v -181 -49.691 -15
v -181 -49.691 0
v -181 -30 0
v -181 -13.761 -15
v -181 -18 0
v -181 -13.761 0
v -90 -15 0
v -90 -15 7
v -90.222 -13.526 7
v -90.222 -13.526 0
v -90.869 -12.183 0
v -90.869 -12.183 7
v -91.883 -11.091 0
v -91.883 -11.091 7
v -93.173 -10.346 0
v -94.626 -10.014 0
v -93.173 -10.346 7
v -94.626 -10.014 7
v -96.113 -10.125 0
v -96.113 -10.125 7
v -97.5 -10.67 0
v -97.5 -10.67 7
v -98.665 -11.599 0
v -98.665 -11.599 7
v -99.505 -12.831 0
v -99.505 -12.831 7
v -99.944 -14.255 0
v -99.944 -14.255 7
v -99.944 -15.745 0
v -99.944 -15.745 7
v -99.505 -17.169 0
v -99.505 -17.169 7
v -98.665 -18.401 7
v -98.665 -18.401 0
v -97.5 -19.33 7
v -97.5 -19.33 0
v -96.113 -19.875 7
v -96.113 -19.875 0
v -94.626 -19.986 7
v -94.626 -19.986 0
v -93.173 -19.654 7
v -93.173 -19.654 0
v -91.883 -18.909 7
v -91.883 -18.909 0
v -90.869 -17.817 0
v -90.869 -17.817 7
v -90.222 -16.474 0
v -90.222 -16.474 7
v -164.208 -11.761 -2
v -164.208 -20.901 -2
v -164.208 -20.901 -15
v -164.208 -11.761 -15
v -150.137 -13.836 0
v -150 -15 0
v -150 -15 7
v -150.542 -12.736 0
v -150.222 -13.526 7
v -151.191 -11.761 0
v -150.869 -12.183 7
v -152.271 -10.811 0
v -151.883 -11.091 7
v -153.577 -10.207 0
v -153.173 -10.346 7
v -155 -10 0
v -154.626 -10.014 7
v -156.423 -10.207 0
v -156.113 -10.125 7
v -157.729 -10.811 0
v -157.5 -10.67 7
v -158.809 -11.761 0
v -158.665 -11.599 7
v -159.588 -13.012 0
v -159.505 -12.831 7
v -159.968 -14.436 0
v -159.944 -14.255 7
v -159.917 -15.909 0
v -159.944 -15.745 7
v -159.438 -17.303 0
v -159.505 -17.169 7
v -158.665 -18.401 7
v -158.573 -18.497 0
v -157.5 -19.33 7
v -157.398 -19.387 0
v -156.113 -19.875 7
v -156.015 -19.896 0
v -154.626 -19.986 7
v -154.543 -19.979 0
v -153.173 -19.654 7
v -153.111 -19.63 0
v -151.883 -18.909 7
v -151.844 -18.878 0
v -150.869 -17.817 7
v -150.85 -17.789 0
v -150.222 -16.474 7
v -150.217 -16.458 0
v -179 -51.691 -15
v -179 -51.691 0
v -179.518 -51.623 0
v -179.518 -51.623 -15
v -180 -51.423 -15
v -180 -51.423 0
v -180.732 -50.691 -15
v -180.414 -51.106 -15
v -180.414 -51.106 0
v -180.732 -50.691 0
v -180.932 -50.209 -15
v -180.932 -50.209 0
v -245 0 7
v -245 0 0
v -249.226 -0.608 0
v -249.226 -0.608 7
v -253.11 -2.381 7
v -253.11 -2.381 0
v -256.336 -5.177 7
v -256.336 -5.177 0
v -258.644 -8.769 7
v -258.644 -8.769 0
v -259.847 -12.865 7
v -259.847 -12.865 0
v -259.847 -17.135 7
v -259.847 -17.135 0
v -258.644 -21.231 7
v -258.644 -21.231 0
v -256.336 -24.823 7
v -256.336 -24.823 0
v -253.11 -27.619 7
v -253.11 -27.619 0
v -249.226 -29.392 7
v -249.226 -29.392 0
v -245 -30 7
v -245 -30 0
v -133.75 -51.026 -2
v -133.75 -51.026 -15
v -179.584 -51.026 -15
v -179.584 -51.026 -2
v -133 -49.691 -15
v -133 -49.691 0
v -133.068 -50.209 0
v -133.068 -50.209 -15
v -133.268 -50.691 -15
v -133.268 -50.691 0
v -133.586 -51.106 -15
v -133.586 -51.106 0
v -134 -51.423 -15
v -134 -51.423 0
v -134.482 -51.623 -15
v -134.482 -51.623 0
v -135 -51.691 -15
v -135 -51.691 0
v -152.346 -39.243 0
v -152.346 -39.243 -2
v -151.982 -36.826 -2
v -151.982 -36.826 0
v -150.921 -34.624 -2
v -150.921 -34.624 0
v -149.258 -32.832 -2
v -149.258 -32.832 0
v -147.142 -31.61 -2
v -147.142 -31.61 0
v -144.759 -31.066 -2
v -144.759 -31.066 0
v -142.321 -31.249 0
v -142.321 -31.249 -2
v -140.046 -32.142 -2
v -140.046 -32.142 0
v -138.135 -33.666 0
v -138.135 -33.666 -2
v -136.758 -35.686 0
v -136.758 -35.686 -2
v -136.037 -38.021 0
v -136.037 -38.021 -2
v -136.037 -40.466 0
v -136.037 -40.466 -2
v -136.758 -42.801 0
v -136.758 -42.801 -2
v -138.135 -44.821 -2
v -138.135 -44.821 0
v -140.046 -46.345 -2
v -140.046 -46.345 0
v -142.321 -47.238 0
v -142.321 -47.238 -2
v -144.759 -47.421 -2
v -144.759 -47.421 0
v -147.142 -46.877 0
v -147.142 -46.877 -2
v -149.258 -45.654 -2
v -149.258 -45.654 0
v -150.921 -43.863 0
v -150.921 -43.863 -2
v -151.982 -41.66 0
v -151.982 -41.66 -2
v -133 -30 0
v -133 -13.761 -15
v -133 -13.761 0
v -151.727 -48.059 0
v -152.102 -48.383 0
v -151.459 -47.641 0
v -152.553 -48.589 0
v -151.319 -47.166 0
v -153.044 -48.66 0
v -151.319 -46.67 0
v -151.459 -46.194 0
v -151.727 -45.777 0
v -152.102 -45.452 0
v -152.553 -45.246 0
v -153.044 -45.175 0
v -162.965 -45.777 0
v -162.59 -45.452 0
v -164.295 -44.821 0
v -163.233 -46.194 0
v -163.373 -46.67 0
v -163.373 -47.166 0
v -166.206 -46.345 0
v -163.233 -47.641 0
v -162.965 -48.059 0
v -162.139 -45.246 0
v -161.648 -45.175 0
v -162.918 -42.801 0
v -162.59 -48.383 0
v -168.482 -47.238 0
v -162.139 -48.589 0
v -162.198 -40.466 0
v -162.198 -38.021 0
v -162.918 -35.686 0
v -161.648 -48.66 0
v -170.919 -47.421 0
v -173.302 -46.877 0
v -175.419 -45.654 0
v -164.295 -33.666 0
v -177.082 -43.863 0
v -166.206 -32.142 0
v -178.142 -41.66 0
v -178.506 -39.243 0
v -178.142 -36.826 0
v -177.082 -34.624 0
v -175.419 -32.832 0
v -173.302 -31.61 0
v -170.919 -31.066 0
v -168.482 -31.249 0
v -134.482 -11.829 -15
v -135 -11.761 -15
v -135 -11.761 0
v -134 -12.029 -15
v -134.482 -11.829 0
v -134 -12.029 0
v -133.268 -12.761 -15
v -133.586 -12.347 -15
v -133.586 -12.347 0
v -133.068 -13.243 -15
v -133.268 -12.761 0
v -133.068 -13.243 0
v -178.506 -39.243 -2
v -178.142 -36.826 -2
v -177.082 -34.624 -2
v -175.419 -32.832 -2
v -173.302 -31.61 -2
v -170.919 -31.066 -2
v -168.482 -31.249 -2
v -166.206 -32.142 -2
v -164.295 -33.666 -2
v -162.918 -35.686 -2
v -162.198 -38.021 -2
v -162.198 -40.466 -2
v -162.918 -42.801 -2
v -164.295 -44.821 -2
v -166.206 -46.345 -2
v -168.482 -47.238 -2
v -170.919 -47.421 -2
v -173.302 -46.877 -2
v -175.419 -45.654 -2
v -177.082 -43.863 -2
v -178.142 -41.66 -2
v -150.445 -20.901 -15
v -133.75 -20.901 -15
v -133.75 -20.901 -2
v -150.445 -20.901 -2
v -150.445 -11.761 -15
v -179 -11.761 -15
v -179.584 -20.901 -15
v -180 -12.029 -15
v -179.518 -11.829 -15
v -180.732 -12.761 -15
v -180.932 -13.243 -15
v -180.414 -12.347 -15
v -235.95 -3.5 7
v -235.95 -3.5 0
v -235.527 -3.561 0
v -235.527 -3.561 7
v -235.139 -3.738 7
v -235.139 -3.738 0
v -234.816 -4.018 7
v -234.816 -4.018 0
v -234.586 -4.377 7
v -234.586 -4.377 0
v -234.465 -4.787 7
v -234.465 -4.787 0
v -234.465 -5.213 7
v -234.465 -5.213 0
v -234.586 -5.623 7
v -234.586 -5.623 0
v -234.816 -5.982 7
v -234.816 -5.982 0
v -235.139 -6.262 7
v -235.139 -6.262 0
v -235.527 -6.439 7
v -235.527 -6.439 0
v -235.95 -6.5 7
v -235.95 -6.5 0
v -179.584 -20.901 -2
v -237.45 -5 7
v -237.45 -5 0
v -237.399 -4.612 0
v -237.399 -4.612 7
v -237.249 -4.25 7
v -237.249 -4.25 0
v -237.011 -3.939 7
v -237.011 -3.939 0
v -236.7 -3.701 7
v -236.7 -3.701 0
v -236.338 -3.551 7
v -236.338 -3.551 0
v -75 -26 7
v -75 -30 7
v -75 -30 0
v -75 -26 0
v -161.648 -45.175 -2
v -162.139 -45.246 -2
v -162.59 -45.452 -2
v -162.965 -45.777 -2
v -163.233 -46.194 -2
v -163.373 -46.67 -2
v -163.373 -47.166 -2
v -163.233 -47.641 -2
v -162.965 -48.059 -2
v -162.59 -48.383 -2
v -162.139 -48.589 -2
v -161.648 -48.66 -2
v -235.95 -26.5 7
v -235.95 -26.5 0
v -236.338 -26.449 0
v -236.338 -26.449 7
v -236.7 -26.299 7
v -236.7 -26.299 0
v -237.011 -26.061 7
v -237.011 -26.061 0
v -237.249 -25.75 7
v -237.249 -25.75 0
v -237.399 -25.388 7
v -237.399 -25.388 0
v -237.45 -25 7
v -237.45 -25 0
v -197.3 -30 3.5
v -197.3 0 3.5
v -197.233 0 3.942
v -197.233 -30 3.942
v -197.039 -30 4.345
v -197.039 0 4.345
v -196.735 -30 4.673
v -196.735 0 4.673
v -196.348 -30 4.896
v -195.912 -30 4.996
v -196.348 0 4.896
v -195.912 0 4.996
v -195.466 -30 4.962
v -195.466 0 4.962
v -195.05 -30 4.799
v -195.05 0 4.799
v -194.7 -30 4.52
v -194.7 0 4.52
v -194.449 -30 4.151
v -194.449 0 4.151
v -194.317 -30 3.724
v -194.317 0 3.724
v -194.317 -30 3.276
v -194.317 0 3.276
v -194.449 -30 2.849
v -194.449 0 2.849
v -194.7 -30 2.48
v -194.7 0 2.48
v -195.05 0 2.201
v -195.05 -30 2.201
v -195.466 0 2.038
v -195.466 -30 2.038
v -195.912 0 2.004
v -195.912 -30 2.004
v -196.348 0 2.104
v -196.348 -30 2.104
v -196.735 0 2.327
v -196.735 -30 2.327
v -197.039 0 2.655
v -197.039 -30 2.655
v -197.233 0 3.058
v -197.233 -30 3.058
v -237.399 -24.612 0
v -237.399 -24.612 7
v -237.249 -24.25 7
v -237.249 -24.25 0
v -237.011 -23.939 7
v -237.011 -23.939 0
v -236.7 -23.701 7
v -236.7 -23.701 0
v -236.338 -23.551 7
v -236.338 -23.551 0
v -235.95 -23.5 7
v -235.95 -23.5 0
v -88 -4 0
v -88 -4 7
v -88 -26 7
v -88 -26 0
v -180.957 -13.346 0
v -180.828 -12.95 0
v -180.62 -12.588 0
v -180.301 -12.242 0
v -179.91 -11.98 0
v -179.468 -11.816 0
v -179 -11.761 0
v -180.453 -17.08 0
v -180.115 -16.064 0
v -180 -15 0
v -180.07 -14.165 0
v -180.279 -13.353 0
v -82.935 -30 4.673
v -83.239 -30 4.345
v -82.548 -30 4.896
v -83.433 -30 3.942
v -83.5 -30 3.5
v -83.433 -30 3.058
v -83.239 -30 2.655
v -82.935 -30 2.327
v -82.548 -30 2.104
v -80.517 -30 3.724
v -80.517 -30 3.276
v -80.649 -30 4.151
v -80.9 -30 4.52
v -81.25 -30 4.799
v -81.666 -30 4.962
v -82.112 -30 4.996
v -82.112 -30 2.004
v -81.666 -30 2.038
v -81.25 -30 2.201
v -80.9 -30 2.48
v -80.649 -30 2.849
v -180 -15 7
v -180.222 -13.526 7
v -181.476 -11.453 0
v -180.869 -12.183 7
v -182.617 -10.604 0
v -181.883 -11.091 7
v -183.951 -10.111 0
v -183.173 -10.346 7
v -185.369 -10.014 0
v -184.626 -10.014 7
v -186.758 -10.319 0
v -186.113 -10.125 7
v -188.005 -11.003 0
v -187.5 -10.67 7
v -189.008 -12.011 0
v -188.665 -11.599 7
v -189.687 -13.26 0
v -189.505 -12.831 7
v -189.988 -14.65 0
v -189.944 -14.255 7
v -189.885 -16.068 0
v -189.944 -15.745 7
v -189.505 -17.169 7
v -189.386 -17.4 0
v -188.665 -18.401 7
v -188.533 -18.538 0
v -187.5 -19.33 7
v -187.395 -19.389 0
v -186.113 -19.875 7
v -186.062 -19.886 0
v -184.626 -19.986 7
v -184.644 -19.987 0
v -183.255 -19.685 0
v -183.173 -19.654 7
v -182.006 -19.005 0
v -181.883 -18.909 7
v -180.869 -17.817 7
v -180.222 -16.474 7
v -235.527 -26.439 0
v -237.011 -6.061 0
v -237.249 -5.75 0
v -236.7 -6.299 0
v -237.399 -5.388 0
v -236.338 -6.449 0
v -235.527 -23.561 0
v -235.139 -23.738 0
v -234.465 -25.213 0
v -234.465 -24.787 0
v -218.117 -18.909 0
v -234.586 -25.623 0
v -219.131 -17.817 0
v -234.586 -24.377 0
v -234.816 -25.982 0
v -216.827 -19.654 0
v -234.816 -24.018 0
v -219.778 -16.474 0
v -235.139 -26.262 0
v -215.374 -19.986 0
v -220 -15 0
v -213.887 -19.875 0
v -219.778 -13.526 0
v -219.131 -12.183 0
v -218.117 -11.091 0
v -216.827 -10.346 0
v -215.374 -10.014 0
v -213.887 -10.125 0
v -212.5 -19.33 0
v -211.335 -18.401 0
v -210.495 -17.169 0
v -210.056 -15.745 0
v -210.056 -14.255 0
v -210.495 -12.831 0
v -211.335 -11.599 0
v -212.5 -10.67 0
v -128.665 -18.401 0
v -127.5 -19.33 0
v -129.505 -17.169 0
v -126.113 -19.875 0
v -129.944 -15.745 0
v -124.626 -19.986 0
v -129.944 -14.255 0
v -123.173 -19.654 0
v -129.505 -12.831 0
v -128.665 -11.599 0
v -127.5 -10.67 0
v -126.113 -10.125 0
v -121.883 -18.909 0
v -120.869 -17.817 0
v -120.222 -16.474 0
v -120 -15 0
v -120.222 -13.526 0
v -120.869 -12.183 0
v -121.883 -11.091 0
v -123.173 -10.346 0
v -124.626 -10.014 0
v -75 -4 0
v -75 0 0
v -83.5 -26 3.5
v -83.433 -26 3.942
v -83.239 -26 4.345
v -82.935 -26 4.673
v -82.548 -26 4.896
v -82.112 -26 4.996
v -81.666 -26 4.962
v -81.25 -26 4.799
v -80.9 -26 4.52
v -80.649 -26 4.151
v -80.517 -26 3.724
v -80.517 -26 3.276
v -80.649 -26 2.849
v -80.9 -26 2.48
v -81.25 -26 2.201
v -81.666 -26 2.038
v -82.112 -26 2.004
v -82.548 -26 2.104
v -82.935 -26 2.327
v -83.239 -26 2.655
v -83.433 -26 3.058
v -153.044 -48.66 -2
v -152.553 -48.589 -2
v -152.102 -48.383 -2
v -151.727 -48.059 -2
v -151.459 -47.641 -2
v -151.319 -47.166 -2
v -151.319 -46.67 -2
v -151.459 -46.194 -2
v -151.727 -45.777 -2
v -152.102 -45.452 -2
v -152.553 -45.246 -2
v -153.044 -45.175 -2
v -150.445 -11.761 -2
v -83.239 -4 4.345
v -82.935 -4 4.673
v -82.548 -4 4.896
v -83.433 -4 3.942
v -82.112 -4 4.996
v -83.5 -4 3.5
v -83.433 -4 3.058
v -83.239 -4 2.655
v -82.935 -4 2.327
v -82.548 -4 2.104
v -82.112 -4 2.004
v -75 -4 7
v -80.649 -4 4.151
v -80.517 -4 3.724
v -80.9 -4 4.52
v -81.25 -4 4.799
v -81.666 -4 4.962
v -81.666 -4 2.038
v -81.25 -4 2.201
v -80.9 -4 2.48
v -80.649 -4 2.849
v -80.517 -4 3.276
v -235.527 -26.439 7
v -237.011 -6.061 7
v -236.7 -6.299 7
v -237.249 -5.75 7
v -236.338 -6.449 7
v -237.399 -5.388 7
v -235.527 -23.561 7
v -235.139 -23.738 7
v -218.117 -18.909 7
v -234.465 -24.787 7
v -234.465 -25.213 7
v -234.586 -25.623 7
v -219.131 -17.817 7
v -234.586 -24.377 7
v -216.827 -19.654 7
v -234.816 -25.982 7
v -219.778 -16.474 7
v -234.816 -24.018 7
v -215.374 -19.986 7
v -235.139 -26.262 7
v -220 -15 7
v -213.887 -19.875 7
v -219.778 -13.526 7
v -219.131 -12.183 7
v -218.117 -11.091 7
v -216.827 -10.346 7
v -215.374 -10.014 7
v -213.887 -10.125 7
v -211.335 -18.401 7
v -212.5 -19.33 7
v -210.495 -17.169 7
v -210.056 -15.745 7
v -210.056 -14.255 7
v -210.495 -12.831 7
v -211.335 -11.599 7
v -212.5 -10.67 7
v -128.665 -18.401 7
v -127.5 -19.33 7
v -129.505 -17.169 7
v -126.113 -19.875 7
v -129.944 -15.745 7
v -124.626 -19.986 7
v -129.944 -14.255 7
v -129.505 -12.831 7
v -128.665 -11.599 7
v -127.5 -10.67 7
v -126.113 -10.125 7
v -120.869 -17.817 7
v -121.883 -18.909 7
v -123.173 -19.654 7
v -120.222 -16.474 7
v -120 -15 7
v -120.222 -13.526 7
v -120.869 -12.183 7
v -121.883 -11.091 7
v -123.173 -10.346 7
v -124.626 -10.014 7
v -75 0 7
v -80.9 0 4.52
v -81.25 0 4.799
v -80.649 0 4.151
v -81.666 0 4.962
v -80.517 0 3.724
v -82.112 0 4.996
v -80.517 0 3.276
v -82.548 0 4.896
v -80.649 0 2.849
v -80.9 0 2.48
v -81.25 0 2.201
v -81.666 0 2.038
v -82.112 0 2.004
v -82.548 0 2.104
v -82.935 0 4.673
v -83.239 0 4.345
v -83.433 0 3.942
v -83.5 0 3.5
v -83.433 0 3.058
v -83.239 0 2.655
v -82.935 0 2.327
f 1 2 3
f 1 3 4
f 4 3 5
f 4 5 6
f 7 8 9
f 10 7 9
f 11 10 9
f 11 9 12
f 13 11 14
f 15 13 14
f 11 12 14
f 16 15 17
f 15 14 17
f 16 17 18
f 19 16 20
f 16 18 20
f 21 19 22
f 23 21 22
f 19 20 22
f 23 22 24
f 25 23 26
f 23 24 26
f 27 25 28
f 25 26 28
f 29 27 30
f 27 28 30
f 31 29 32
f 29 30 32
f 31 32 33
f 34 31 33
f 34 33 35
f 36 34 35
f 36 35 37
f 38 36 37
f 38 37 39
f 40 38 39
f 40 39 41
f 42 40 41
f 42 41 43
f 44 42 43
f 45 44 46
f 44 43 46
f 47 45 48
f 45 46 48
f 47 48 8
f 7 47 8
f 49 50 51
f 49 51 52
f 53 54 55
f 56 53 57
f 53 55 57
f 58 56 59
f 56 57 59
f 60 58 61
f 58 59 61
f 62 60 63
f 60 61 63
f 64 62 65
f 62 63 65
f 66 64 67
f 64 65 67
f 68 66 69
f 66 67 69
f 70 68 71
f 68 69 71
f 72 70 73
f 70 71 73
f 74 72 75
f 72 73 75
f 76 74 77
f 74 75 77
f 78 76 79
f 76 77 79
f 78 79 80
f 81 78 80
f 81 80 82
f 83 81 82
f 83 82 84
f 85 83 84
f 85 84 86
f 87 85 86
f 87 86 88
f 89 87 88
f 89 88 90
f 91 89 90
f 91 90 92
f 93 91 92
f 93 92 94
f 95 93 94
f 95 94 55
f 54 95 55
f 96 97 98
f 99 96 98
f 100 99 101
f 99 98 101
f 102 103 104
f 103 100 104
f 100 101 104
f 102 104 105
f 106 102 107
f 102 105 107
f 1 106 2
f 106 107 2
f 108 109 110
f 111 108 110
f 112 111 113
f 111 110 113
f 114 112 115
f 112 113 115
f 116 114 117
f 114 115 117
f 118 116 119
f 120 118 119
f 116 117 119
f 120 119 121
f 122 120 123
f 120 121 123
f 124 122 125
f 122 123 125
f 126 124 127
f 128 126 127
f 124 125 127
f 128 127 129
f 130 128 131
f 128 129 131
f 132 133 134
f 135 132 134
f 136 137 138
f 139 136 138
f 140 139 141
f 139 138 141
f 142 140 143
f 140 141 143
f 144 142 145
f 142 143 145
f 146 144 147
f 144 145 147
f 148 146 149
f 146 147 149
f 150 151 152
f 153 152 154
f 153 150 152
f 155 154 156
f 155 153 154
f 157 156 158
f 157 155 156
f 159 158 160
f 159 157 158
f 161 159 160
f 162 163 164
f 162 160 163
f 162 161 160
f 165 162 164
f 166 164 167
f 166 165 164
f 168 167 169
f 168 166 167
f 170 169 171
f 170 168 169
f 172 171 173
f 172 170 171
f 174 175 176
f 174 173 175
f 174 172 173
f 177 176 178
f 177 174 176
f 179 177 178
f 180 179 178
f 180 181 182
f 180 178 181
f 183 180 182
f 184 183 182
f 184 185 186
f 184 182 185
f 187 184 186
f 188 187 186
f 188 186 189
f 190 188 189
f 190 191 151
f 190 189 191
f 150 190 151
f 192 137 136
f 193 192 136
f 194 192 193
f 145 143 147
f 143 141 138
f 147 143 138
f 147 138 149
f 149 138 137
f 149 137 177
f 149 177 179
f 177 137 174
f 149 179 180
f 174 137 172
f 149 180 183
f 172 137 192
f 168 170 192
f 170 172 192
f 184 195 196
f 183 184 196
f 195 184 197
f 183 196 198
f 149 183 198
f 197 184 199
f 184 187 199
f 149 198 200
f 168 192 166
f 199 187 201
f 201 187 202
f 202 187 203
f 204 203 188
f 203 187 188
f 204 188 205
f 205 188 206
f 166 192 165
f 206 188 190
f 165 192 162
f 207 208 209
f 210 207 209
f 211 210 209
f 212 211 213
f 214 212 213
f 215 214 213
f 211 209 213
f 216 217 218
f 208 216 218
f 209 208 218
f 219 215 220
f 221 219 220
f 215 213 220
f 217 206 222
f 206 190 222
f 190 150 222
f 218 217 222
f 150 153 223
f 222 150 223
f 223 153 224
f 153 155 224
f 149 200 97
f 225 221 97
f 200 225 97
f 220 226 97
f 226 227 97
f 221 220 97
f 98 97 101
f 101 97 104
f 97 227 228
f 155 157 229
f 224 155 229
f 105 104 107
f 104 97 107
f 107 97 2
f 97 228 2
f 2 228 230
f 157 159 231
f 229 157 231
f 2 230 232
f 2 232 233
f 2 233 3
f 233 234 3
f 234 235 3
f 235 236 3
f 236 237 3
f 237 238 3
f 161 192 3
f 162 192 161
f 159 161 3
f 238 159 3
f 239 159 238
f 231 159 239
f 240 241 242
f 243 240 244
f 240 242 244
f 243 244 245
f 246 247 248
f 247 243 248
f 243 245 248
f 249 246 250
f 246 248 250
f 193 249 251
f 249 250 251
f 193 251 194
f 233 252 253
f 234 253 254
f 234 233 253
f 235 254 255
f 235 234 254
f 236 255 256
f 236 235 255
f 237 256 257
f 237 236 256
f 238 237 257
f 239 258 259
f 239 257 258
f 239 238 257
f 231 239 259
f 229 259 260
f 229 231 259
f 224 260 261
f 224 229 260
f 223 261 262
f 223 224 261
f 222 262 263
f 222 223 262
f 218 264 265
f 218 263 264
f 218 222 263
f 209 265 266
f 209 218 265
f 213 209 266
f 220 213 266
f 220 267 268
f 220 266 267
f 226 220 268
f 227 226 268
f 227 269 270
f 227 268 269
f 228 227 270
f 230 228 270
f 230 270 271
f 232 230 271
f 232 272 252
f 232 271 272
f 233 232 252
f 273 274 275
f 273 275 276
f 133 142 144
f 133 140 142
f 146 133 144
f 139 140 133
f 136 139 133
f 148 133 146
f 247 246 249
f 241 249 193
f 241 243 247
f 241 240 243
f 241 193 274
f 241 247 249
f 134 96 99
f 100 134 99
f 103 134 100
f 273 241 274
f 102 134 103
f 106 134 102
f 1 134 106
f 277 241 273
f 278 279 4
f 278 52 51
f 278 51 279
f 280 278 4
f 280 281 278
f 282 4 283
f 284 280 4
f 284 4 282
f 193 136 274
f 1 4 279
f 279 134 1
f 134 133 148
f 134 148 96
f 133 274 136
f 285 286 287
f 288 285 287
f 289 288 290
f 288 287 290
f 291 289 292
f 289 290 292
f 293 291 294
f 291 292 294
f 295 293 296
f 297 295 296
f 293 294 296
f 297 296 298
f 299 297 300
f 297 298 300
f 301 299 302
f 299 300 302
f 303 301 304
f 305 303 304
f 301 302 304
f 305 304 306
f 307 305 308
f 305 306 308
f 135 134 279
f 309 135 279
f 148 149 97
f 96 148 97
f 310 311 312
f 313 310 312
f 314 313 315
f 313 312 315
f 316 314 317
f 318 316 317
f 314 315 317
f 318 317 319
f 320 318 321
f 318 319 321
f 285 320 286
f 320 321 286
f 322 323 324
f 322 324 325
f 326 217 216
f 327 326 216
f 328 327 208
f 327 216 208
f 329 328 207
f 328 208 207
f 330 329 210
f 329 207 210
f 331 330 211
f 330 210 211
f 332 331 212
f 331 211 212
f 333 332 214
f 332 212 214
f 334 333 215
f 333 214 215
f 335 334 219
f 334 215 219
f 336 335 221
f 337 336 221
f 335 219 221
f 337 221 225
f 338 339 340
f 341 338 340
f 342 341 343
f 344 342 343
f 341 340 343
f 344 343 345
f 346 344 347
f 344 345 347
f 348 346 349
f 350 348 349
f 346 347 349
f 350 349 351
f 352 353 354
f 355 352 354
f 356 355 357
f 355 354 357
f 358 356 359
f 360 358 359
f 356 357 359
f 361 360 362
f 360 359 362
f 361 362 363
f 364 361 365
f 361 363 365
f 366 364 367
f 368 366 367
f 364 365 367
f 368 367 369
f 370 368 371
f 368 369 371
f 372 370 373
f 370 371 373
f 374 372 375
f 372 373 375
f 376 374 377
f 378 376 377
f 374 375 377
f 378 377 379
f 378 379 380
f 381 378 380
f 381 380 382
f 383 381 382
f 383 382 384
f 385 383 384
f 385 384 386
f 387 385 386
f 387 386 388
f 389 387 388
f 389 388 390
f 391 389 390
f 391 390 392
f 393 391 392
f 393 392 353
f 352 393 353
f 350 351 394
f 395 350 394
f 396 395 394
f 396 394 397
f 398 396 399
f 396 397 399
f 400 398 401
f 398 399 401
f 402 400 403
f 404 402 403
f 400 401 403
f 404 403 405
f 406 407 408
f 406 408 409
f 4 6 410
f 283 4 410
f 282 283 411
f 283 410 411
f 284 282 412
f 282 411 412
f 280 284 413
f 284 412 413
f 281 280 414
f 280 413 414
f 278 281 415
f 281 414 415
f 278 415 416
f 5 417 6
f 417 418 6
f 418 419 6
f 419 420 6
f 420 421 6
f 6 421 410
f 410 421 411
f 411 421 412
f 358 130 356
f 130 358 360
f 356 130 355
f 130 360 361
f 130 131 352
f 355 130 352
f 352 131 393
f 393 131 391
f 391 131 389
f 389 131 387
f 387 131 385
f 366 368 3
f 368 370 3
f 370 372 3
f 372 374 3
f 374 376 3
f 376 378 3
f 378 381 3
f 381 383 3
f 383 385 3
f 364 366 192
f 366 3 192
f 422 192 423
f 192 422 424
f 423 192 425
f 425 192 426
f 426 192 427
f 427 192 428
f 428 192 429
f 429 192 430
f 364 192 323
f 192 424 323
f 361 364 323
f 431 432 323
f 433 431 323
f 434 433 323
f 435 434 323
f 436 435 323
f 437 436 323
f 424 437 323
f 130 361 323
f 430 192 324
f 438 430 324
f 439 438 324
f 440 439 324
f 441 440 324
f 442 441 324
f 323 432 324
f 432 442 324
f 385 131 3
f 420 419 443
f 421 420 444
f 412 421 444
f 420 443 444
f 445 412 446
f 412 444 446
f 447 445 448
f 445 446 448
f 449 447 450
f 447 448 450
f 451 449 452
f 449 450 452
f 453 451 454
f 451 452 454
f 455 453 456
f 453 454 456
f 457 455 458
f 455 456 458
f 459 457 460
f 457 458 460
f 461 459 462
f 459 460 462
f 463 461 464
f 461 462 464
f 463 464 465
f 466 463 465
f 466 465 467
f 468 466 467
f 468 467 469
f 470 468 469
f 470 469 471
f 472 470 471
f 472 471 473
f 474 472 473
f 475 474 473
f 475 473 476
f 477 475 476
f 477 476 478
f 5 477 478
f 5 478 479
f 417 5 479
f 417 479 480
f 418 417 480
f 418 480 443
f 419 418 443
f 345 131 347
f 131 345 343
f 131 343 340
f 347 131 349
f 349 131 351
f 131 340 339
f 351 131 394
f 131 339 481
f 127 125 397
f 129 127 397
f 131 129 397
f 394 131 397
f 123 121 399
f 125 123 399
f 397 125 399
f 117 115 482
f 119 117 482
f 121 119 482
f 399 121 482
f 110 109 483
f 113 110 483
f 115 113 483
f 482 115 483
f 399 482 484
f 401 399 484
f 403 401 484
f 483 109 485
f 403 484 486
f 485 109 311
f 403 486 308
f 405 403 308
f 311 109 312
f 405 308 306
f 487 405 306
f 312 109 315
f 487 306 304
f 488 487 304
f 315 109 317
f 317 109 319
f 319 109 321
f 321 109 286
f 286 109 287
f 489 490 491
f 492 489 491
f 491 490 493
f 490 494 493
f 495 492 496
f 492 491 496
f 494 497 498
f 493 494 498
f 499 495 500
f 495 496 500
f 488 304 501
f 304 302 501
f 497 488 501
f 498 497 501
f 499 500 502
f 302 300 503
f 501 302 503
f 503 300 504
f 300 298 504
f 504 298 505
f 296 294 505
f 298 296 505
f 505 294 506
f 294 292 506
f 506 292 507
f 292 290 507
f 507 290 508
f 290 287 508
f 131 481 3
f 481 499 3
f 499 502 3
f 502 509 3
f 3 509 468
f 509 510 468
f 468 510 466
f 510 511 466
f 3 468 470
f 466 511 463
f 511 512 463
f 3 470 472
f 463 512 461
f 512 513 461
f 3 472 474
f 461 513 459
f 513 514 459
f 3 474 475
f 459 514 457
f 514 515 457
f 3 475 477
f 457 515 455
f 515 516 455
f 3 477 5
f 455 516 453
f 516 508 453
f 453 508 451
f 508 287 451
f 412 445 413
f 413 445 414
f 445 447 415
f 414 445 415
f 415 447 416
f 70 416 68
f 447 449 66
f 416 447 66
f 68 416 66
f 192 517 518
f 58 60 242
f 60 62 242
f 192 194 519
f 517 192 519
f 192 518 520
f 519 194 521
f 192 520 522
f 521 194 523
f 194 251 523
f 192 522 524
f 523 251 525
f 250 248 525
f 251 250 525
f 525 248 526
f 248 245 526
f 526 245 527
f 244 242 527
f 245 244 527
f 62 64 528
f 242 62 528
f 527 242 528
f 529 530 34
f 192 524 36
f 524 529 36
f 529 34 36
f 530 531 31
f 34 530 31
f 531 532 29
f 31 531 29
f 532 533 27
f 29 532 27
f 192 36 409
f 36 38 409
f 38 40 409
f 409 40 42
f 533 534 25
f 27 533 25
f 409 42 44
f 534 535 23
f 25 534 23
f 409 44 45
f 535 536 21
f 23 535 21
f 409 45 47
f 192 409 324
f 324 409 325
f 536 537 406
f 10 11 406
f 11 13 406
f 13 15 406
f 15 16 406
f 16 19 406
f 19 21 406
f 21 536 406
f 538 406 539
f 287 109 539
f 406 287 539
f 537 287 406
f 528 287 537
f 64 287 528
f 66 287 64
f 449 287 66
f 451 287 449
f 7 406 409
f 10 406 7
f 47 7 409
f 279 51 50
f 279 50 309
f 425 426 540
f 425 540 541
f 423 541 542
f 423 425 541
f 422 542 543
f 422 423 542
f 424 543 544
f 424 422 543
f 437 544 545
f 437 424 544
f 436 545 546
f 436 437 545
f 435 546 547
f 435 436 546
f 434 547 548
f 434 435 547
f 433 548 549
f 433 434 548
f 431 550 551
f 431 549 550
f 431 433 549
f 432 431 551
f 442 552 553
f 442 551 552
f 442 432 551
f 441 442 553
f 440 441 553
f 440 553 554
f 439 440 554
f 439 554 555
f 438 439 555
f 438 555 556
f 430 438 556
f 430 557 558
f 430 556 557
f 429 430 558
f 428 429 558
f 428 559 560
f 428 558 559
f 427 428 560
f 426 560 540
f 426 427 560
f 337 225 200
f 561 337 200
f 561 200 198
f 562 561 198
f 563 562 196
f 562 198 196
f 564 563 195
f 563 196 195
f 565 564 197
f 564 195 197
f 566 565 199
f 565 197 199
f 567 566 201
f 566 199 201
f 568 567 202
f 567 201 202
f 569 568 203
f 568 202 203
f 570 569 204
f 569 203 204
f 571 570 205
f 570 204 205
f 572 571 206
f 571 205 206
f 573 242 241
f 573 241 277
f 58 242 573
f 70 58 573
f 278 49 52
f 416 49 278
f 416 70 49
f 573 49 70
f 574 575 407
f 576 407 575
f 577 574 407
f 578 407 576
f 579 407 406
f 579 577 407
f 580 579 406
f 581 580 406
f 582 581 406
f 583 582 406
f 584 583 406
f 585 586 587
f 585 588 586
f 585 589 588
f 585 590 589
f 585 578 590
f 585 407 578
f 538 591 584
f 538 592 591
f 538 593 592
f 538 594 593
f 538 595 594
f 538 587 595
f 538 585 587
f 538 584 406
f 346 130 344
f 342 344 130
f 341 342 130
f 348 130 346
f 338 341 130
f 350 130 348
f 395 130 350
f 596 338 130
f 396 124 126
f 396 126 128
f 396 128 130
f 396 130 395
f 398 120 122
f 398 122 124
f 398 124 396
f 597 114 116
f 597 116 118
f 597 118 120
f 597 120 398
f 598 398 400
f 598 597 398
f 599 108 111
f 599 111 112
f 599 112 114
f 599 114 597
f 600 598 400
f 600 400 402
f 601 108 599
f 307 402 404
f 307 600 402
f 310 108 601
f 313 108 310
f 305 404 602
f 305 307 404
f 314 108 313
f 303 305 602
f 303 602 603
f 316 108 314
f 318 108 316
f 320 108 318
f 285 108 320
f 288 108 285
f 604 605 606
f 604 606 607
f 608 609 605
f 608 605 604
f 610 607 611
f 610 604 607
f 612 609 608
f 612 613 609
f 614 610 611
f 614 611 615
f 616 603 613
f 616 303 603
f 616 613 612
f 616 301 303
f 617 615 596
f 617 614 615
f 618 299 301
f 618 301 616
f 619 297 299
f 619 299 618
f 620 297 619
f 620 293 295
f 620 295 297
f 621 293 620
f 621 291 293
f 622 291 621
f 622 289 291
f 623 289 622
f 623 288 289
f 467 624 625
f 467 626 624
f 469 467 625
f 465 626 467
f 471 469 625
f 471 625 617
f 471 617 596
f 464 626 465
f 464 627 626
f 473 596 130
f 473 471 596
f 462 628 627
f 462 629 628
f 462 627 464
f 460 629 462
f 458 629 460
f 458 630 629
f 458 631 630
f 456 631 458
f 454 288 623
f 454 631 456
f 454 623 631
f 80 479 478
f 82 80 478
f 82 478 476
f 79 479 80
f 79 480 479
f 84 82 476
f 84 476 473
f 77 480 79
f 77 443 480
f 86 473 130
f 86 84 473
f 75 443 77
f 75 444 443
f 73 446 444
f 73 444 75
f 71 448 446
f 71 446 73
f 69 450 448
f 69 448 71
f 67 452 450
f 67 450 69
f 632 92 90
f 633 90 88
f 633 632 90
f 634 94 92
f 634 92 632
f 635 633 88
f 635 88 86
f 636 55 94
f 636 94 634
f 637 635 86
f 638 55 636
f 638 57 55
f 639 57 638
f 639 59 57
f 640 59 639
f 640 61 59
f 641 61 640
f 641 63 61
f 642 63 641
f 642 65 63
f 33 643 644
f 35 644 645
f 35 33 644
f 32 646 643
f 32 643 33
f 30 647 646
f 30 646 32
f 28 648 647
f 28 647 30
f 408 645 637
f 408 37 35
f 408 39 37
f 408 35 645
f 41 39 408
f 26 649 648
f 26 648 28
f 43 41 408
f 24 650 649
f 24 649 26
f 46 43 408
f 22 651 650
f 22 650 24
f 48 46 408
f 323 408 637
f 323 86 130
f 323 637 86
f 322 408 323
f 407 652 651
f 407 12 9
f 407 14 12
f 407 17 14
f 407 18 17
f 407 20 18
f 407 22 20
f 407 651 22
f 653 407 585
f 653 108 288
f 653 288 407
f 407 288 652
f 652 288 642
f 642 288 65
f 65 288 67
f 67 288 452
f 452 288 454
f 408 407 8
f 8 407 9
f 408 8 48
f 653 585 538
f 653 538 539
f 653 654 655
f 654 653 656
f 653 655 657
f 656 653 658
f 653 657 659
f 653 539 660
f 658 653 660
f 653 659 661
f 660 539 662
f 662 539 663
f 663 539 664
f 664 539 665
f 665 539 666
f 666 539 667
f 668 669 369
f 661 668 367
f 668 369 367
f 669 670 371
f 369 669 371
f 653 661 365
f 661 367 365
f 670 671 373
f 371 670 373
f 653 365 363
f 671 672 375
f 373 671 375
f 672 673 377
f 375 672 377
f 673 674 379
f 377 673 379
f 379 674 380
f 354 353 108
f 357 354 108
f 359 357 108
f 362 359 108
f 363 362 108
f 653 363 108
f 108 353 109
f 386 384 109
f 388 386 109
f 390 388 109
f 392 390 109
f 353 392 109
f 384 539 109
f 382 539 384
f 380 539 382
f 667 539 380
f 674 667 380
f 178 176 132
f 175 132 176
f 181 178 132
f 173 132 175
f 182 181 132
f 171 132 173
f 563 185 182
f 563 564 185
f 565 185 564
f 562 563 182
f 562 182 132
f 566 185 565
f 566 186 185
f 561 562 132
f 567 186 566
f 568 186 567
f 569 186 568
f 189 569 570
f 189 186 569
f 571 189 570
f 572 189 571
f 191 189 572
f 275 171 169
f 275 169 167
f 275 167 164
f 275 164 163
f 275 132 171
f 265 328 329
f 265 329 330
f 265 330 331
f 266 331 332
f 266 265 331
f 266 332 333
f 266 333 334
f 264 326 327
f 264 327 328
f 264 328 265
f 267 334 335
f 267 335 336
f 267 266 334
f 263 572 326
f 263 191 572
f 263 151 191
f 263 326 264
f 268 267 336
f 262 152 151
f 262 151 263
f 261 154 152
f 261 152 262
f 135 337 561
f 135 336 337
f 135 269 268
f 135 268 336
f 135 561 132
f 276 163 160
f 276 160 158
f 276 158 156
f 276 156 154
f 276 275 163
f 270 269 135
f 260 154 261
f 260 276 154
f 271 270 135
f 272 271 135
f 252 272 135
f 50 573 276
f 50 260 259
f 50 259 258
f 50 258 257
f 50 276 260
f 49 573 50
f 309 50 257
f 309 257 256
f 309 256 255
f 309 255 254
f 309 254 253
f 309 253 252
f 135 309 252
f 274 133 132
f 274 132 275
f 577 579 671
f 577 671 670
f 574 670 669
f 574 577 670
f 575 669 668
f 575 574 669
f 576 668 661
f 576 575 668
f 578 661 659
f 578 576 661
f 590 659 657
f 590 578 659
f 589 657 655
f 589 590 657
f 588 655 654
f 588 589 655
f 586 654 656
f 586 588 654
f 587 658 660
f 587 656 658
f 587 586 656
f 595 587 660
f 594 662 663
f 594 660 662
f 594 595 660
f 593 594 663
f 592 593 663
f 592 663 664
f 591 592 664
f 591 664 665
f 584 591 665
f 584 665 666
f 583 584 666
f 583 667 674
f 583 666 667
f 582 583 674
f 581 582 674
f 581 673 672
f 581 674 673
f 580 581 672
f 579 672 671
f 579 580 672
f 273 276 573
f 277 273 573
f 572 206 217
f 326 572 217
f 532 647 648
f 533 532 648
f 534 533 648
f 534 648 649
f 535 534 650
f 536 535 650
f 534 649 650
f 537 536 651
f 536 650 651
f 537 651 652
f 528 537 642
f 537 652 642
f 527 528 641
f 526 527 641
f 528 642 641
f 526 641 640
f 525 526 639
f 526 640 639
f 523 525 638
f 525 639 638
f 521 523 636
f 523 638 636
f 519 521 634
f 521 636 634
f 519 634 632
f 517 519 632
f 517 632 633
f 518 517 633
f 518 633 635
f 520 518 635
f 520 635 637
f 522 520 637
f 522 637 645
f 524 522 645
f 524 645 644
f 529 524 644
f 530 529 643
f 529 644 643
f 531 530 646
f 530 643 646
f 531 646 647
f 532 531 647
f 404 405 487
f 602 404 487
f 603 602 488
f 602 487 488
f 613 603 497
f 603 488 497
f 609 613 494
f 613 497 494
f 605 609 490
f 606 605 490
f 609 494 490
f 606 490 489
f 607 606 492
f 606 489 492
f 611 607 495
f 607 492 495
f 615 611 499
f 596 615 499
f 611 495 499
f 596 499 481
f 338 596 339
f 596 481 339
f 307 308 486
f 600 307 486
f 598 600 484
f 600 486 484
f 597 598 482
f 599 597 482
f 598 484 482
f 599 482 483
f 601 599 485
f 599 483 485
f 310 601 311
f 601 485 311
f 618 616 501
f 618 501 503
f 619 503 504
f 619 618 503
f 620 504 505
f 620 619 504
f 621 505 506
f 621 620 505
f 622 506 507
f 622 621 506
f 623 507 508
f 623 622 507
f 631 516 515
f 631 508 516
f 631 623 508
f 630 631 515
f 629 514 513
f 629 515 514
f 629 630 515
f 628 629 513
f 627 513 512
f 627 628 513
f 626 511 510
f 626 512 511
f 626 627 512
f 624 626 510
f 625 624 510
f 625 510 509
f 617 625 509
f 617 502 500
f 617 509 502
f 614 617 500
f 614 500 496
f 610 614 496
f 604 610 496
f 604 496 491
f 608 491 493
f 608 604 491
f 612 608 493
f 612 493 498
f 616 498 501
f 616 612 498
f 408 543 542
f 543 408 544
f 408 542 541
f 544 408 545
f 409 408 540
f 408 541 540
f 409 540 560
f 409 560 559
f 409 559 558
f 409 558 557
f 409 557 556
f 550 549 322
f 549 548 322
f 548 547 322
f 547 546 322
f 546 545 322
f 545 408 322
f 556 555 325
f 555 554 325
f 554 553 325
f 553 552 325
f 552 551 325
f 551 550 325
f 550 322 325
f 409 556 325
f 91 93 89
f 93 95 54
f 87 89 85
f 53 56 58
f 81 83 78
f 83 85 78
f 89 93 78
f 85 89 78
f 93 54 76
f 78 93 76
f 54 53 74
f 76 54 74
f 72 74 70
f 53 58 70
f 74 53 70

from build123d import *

# Parameters (mm, degrees)
BOSS_EXTRUDE1_DEPTH      = 7
SKETCH2_R                = 5
CUT_EXTRUDE1_DEPTH       = 7
LPATTERN1_COUNT          = 7
LPATTERN1_PITCH          = 30
SKETCH6_R                = 5
CUT_EXTRUDE2_DEPTH       = 10
CUT_EXTRUDE4_REACH       = 219.196
SKETCH9_R                = 1.5
CUT_EXTRUDE9_REACH       = 219.196
SKETCH15_R               = 1.5
SKETCH15_R_2             = 2.5
SKETCH16_W               = 48
SKETCH16_H               = 39.930416712
SKETCH16_R               = 8.2
BOSS_EXTRUDE2_DEPTH      = 15
SKETCH17_W               = 45.833760325
SKETCH17_H               = 30.12512517
SKETCH17_W_2             = 13.763297708
SKETCH17_H_2             = 9.222578979
CUT_EXTRUDE15_DEPTH      = 13
CUT_EXTRUDE16_REACH      = 224.218
SKETCH18_W               = 140
SKETCH18_H               = 115.832892108
FILLET1_R                = 2
BOSS_EXTRUDE4_DEPTH      = 7
CUT_EXTRUDE17_DEPTH      = 10
SKETCH27_W               = 7
SKETCH27_H               = 22
CUT_EXTRUDE18_DEPTH      = 13
CUT_EXTRUDE19_DEPTH      = 266.512692236
CUT_EXTRUDE19_DEPTH_BACK = 266.512692236
SKETCH28_R               = 1.5
CUT_EXTRUDE20_DEPTH      = 266.512692236
CUT_EXTRUDE20_DEPTH_BACK = 266.512692236
SKETCH29_R               = 5


with BuildPart() as part:
    # Sketch1 → Boss-Extrude1 (new body)
    with BuildSketch(Plane.XY):
        with BuildLine():
            Line((-200, 0), (50, 0))
            ThreePointArc((50, 0), (65, -15), (50, -30))
            Line((50, -30), (-200, -30))
            ThreePointArc((-200, -30), (-215, -15), (-200, 0))
        make_face()
    extrude(amount=BOSS_EXTRUDE1_DEPTH)

    # Sketch2 → Cut-Extrude1 (cut)
    with BuildSketch(Plane.XY.offset(7)):
        with Locations((-185, -15)):
            Circle(SKETCH2_R)
    cut_extrude1 = extrude(amount=-CUT_EXTRUDE1_DEPTH, mode=Mode.SUBTRACT)

    # LPattern1: Cut-Extrude1 ×7
    with Locations(*[(i * LPATTERN1_PITCH, 0, 0) for i in range(1, LPATTERN1_COUNT)]):
        add(cut_extrude1, mode=Mode.SUBTRACT)

    # Sketch6 → Cut-Extrude2 (cut)
    with BuildSketch(Plane(origin=(0, 0, 0), x_dir=(-1, 0, 0), z_dir=(0, 0, -1))):
        with Locations((-50, -15)):
            Circle(SKETCH6_R)
    extrude(amount=-CUT_EXTRUDE2_DEPTH, mode=Mode.SUBTRACT)

    # Sketch9 → Cut-Extrude4 (cut, up to next)
    with BuildSketch(Plane(origin=(0, 0, 0), x_dir=(-1, 0, 0), z_dir=(0, 0, -1)), mode=Mode.PRIVATE) as cut_extrude4_sk1:
        with Locations((-29.5, -6.25)):
            Circle(SKETCH9_R)
    cut_extrude4_tool1 = extrude(cut_extrude4_sk1.sketch, amount=-CUT_EXTRUDE4_REACH, mode=Mode.PRIVATE) & part.part
    # Sketch9 → Cut-Extrude4 (cut, up to next)
    with BuildSketch(Plane(origin=(0, 0, 0), x_dir=(-1, 0, 0), z_dir=(0, 0, -1)), mode=Mode.PRIVATE) as cut_extrude4_sk2:
        with Locations((-29.5, -23.75)):
            Circle(SKETCH9_R)
    cut_extrude4_tool2 = extrude(cut_extrude4_sk2.sketch, amount=-CUT_EXTRUDE4_REACH, mode=Mode.PRIVATE) & part.part
    add(cut_extrude4_tool1.solids().sort_by_distance((29.5, -6.25, 0))[0], mode=Mode.SUBTRACT)
    add(cut_extrude4_tool2.solids().sort_by_distance((29.5, -23.75, 0))[0], mode=Mode.SUBTRACT)

    # Sketch15 → Cut-Extrude9 (cut, up to next)
    with BuildSketch(Plane(origin=(0, 0, 0), x_dir=(1, 0, 0), z_dir=(0, 1, 0)), mode=Mode.PRIVATE) as cut_extrude9_sk1:
        with Locations(Location((-195.8, -3.5, 0), (0, 0, 180))):
            Circle(SKETCH15_R)
    cut_extrude9_tool1 = extrude(cut_extrude9_sk1.sketch, amount=-CUT_EXTRUDE9_REACH, mode=Mode.PRIVATE) & part.part
    # Sketch15 → Cut-Extrude9 (cut, up to next)
    with BuildSketch(Plane(origin=(0, 0, 0), x_dir=(1, 0, 0), z_dir=(0, 1, 0)), mode=Mode.PRIVATE) as cut_extrude9_sk2:
        with Locations(Location((45.8, -3.5, 0), (0, 0, 180))):
            Circle(SKETCH15_R_2)
    cut_extrude9_tool2 = extrude(cut_extrude9_sk2.sketch, amount=-CUT_EXTRUDE9_REACH, mode=Mode.PRIVATE) & part.part
    add(cut_extrude9_tool1.solids().sort_by_distance((-195.8, 0, 3.5))[0], mode=Mode.SUBTRACT)
    add(cut_extrude9_tool2.solids().sort_by_distance((45.8, 0, 3.5))[0], mode=Mode.SUBTRACT)

    # Sketch16 → Boss-Extrude2 (add)
    with BuildSketch(Plane(origin=(0, 0, 0), x_dir=(-1, 0, 0), z_dir=(0, 0, -1))):
        with Locations((157, -31.726084321)):
            Rectangle(SKETCH16_W, SKETCH16_H)
        with Locations((144.145834, -39.243444981)):
            Circle(SKETCH16_R, mode=Mode.SUBTRACT)
        with Locations((170.306394211, -39.243444981)):
            Circle(SKETCH16_R, mode=Mode.SUBTRACT)
        with BuildLine():
            Line((153.043612384, -45.175236858), (161.648055614, -45.175236858))
            ThreePointArc((161.648055614, -45.175236858), (163.390378659, -46.917559902), (161.648055614, -48.659882947))
            Line((161.648055614, -48.659882947), (153.043612384, -48.659882947))
            ThreePointArc((153.043612384, -48.659882947), (151.301289339, -46.917559902), (153.043612384, -45.175236858))
        make_face(mode=Mode.SUBTRACT)
    extrude(amount=BOSS_EXTRUDE2_DEPTH)

    # Sketch17 → Cut-Extrude15 (cut)
    with BuildSketch(Plane(origin=(0, 0, -15), x_dir=(-1, 0, 0), z_dir=(0, 0, -1))):
        with Locations((156.666880163, -35.963336462)):
            Rectangle(SKETCH17_W, SKETCH17_H)
        with Locations((157.326506844, -16.372165454)):
            Rectangle(SKETCH17_W_2, SKETCH17_H_2)
    extrude(amount=-CUT_EXTRUDE15_DEPTH, mode=Mode.SUBTRACT)

    # Sketch18 → Cut-Extrude16 (cut, up to next)
    with BuildSketch(Plane.XY.offset(7), mode=Mode.PRIVATE) as cut_extrude16_sk1:
        with Locations((-5, -15.036727437)):
            Rectangle(SKETCH18_W, SKETCH18_H)
    cut_extrude16_tool1 = extrude(cut_extrude16_sk1.sketch, amount=-CUT_EXTRUDE16_REACH, mode=Mode.PRIVATE) & part.part
    add(cut_extrude16_tool1.solids().sort_by_distance((-5, -15.036727, 7))[0], mode=Mode.SUBTRACT)

    # Fillet1
    # the kernel refuses this fillet: 2 mm, written as the material it takes off along each edge
    with BuildSketch(Plane(origin=(-133, -51.691292677, 5), x_dir=(0, 1, 0), z_dir=(0, 0, -1))) as fillet1_piece_1:
        with BuildLine():
            CenterArc((FILLET1_R, -FILLET1_R), FILLET1_R, 90, 90)
            Line((0, -FILLET1_R), (0, 0))
            Line((0, 0), (FILLET1_R, 0))
        make_face()
    extrude(amount=25, mode=Mode.SUBTRACT)
    with BuildSketch(Plane(origin=(-181, -51.691292677, 5), x_dir=(0, 1, 0), z_dir=(0, 0, -1))) as fillet1_piece_2:
        with BuildLine():
            CenterArc((FILLET1_R, FILLET1_R), FILLET1_R, 180, 90)
            Line((0, FILLET1_R), (0, 0))
            Line((0, 0), (FILLET1_R, 0))
        make_face()
    extrude(amount=25, mode=Mode.SUBTRACT)
    with BuildSketch(Plane(origin=(-181, -11.760875965, 0), x_dir=(0, -1, 0), z_dir=(0, 0, -1)), Plane(origin=(-133, -11.760875965, 0), x_dir=(-1, 0, 0), z_dir=(0, 0, -1))) as fillet1_piece_3:
        with BuildLine():
            CenterArc((FILLET1_R, -FILLET1_R), FILLET1_R, 90, 90)
            Line((0, -FILLET1_R), (0, 0))
            Line((0, 0), (FILLET1_R, 0))
        make_face()
    extrude(amount=20, mode=Mode.SUBTRACT)

    # Sketch24 → Boss-Extrude4 (add)
    with BuildSketch(Plane(origin=(0, 0, 0), x_dir=(-1, 0, 0), z_dir=(0, 0, -1))):
        with BuildLine():
            ThreePointArc((245, 0), (260, -15), (245, -30))
            Line((245, -30), (245, 0))
        make_face()
        with BuildLine():
            Line((245, 0), (245, -30))
            Line((245, -30), (200, -30))
            ThreePointArc((200, -30), (215, -15), (200, 0))
            Line((200, 0), (245, 0))
        make_face()
    extrude(amount=-BOSS_EXTRUDE4_DEPTH)

    # Sketch25 → Cut-Extrude17 (cut)
    with BuildSketch(Plane(origin=(0, 0, 0), x_dir=(-1, 0, 0), z_dir=(0, 0, -1))):
        with BuildLine():
            ThreePointArc((237.45, -25), (237.010660172, -23.939339828), (235.95, -23.5))
            Line((235.95, -23.5), (235.95, -26.5))
            ThreePointArc((235.95, -26.5), (237.010660172, -26.060660172), (237.45, -25))
        make_face()
        with BuildLine():
            Line((235.95, -26.5), (235.95, -23.5))
            ThreePointArc((235.95, -23.5), (234.45, -25), (235.95, -26.5))
        make_face()
        with BuildLine():
            ThreePointArc((237.45, -5), (237.010660172, -3.939339828), (235.95, -3.5))
            Line((235.95, -3.5), (235.95, -6.5))
            ThreePointArc((235.95, -6.5), (237.010660172, -6.060660172), (237.45, -5))
        make_face()
        with BuildLine():
            Line((235.95, -6.5), (235.95, -3.5))
            ThreePointArc((235.95, -3.5), (234.45, -5), (235.95, -6.5))
        make_face()
    extrude(amount=-CUT_EXTRUDE17_DEPTH, mode=Mode.SUBTRACT)

    # Sketch27 → Cut-Extrude18 (cut)
    with BuildSketch(Plane(origin=(-75, 0, 0), x_dir=(0, 0, -1), z_dir=(1, 0, 0))):
        with Locations((-3.5, -15)):
            Rectangle(SKETCH27_W, SKETCH27_H)
    extrude(amount=-CUT_EXTRUDE18_DEPTH, mode=Mode.SUBTRACT)

    # Sketch28 → Cut-Extrude19 (cut, two sides: drawn at the far end of the back side and taken through both)
    with BuildSketch(Plane(origin=(0, 0, 0), x_dir=(1, 0, 0), z_dir=(0, 1, 0)).offset(-CUT_EXTRUDE19_DEPTH_BACK)):
        with Locations(Location((-82, -3.5, 0), (0, 0, 180))):
            Circle(SKETCH28_R)
    extrude(amount=CUT_EXTRUDE19_DEPTH + CUT_EXTRUDE19_DEPTH_BACK, mode=Mode.SUBTRACT)

    # Sketch29 → Cut-Extrude20 (cut, two sides: drawn at the far end of the back side and taken through both)
    with BuildSketch(Plane(origin=(0, 0, 0), x_dir=(-1, 0, 0), z_dir=(0, 0, -1)).offset(-CUT_EXTRUDE20_DEPTH_BACK)):
        with Locations((215, -15)):
            Circle(SKETCH29_R)
    extrude(amount=CUT_EXTRUDE20_DEPTH + CUT_EXTRUDE20_DEPTH_BACK, mode=Mode.SUBTRACT)


solid = part.part
